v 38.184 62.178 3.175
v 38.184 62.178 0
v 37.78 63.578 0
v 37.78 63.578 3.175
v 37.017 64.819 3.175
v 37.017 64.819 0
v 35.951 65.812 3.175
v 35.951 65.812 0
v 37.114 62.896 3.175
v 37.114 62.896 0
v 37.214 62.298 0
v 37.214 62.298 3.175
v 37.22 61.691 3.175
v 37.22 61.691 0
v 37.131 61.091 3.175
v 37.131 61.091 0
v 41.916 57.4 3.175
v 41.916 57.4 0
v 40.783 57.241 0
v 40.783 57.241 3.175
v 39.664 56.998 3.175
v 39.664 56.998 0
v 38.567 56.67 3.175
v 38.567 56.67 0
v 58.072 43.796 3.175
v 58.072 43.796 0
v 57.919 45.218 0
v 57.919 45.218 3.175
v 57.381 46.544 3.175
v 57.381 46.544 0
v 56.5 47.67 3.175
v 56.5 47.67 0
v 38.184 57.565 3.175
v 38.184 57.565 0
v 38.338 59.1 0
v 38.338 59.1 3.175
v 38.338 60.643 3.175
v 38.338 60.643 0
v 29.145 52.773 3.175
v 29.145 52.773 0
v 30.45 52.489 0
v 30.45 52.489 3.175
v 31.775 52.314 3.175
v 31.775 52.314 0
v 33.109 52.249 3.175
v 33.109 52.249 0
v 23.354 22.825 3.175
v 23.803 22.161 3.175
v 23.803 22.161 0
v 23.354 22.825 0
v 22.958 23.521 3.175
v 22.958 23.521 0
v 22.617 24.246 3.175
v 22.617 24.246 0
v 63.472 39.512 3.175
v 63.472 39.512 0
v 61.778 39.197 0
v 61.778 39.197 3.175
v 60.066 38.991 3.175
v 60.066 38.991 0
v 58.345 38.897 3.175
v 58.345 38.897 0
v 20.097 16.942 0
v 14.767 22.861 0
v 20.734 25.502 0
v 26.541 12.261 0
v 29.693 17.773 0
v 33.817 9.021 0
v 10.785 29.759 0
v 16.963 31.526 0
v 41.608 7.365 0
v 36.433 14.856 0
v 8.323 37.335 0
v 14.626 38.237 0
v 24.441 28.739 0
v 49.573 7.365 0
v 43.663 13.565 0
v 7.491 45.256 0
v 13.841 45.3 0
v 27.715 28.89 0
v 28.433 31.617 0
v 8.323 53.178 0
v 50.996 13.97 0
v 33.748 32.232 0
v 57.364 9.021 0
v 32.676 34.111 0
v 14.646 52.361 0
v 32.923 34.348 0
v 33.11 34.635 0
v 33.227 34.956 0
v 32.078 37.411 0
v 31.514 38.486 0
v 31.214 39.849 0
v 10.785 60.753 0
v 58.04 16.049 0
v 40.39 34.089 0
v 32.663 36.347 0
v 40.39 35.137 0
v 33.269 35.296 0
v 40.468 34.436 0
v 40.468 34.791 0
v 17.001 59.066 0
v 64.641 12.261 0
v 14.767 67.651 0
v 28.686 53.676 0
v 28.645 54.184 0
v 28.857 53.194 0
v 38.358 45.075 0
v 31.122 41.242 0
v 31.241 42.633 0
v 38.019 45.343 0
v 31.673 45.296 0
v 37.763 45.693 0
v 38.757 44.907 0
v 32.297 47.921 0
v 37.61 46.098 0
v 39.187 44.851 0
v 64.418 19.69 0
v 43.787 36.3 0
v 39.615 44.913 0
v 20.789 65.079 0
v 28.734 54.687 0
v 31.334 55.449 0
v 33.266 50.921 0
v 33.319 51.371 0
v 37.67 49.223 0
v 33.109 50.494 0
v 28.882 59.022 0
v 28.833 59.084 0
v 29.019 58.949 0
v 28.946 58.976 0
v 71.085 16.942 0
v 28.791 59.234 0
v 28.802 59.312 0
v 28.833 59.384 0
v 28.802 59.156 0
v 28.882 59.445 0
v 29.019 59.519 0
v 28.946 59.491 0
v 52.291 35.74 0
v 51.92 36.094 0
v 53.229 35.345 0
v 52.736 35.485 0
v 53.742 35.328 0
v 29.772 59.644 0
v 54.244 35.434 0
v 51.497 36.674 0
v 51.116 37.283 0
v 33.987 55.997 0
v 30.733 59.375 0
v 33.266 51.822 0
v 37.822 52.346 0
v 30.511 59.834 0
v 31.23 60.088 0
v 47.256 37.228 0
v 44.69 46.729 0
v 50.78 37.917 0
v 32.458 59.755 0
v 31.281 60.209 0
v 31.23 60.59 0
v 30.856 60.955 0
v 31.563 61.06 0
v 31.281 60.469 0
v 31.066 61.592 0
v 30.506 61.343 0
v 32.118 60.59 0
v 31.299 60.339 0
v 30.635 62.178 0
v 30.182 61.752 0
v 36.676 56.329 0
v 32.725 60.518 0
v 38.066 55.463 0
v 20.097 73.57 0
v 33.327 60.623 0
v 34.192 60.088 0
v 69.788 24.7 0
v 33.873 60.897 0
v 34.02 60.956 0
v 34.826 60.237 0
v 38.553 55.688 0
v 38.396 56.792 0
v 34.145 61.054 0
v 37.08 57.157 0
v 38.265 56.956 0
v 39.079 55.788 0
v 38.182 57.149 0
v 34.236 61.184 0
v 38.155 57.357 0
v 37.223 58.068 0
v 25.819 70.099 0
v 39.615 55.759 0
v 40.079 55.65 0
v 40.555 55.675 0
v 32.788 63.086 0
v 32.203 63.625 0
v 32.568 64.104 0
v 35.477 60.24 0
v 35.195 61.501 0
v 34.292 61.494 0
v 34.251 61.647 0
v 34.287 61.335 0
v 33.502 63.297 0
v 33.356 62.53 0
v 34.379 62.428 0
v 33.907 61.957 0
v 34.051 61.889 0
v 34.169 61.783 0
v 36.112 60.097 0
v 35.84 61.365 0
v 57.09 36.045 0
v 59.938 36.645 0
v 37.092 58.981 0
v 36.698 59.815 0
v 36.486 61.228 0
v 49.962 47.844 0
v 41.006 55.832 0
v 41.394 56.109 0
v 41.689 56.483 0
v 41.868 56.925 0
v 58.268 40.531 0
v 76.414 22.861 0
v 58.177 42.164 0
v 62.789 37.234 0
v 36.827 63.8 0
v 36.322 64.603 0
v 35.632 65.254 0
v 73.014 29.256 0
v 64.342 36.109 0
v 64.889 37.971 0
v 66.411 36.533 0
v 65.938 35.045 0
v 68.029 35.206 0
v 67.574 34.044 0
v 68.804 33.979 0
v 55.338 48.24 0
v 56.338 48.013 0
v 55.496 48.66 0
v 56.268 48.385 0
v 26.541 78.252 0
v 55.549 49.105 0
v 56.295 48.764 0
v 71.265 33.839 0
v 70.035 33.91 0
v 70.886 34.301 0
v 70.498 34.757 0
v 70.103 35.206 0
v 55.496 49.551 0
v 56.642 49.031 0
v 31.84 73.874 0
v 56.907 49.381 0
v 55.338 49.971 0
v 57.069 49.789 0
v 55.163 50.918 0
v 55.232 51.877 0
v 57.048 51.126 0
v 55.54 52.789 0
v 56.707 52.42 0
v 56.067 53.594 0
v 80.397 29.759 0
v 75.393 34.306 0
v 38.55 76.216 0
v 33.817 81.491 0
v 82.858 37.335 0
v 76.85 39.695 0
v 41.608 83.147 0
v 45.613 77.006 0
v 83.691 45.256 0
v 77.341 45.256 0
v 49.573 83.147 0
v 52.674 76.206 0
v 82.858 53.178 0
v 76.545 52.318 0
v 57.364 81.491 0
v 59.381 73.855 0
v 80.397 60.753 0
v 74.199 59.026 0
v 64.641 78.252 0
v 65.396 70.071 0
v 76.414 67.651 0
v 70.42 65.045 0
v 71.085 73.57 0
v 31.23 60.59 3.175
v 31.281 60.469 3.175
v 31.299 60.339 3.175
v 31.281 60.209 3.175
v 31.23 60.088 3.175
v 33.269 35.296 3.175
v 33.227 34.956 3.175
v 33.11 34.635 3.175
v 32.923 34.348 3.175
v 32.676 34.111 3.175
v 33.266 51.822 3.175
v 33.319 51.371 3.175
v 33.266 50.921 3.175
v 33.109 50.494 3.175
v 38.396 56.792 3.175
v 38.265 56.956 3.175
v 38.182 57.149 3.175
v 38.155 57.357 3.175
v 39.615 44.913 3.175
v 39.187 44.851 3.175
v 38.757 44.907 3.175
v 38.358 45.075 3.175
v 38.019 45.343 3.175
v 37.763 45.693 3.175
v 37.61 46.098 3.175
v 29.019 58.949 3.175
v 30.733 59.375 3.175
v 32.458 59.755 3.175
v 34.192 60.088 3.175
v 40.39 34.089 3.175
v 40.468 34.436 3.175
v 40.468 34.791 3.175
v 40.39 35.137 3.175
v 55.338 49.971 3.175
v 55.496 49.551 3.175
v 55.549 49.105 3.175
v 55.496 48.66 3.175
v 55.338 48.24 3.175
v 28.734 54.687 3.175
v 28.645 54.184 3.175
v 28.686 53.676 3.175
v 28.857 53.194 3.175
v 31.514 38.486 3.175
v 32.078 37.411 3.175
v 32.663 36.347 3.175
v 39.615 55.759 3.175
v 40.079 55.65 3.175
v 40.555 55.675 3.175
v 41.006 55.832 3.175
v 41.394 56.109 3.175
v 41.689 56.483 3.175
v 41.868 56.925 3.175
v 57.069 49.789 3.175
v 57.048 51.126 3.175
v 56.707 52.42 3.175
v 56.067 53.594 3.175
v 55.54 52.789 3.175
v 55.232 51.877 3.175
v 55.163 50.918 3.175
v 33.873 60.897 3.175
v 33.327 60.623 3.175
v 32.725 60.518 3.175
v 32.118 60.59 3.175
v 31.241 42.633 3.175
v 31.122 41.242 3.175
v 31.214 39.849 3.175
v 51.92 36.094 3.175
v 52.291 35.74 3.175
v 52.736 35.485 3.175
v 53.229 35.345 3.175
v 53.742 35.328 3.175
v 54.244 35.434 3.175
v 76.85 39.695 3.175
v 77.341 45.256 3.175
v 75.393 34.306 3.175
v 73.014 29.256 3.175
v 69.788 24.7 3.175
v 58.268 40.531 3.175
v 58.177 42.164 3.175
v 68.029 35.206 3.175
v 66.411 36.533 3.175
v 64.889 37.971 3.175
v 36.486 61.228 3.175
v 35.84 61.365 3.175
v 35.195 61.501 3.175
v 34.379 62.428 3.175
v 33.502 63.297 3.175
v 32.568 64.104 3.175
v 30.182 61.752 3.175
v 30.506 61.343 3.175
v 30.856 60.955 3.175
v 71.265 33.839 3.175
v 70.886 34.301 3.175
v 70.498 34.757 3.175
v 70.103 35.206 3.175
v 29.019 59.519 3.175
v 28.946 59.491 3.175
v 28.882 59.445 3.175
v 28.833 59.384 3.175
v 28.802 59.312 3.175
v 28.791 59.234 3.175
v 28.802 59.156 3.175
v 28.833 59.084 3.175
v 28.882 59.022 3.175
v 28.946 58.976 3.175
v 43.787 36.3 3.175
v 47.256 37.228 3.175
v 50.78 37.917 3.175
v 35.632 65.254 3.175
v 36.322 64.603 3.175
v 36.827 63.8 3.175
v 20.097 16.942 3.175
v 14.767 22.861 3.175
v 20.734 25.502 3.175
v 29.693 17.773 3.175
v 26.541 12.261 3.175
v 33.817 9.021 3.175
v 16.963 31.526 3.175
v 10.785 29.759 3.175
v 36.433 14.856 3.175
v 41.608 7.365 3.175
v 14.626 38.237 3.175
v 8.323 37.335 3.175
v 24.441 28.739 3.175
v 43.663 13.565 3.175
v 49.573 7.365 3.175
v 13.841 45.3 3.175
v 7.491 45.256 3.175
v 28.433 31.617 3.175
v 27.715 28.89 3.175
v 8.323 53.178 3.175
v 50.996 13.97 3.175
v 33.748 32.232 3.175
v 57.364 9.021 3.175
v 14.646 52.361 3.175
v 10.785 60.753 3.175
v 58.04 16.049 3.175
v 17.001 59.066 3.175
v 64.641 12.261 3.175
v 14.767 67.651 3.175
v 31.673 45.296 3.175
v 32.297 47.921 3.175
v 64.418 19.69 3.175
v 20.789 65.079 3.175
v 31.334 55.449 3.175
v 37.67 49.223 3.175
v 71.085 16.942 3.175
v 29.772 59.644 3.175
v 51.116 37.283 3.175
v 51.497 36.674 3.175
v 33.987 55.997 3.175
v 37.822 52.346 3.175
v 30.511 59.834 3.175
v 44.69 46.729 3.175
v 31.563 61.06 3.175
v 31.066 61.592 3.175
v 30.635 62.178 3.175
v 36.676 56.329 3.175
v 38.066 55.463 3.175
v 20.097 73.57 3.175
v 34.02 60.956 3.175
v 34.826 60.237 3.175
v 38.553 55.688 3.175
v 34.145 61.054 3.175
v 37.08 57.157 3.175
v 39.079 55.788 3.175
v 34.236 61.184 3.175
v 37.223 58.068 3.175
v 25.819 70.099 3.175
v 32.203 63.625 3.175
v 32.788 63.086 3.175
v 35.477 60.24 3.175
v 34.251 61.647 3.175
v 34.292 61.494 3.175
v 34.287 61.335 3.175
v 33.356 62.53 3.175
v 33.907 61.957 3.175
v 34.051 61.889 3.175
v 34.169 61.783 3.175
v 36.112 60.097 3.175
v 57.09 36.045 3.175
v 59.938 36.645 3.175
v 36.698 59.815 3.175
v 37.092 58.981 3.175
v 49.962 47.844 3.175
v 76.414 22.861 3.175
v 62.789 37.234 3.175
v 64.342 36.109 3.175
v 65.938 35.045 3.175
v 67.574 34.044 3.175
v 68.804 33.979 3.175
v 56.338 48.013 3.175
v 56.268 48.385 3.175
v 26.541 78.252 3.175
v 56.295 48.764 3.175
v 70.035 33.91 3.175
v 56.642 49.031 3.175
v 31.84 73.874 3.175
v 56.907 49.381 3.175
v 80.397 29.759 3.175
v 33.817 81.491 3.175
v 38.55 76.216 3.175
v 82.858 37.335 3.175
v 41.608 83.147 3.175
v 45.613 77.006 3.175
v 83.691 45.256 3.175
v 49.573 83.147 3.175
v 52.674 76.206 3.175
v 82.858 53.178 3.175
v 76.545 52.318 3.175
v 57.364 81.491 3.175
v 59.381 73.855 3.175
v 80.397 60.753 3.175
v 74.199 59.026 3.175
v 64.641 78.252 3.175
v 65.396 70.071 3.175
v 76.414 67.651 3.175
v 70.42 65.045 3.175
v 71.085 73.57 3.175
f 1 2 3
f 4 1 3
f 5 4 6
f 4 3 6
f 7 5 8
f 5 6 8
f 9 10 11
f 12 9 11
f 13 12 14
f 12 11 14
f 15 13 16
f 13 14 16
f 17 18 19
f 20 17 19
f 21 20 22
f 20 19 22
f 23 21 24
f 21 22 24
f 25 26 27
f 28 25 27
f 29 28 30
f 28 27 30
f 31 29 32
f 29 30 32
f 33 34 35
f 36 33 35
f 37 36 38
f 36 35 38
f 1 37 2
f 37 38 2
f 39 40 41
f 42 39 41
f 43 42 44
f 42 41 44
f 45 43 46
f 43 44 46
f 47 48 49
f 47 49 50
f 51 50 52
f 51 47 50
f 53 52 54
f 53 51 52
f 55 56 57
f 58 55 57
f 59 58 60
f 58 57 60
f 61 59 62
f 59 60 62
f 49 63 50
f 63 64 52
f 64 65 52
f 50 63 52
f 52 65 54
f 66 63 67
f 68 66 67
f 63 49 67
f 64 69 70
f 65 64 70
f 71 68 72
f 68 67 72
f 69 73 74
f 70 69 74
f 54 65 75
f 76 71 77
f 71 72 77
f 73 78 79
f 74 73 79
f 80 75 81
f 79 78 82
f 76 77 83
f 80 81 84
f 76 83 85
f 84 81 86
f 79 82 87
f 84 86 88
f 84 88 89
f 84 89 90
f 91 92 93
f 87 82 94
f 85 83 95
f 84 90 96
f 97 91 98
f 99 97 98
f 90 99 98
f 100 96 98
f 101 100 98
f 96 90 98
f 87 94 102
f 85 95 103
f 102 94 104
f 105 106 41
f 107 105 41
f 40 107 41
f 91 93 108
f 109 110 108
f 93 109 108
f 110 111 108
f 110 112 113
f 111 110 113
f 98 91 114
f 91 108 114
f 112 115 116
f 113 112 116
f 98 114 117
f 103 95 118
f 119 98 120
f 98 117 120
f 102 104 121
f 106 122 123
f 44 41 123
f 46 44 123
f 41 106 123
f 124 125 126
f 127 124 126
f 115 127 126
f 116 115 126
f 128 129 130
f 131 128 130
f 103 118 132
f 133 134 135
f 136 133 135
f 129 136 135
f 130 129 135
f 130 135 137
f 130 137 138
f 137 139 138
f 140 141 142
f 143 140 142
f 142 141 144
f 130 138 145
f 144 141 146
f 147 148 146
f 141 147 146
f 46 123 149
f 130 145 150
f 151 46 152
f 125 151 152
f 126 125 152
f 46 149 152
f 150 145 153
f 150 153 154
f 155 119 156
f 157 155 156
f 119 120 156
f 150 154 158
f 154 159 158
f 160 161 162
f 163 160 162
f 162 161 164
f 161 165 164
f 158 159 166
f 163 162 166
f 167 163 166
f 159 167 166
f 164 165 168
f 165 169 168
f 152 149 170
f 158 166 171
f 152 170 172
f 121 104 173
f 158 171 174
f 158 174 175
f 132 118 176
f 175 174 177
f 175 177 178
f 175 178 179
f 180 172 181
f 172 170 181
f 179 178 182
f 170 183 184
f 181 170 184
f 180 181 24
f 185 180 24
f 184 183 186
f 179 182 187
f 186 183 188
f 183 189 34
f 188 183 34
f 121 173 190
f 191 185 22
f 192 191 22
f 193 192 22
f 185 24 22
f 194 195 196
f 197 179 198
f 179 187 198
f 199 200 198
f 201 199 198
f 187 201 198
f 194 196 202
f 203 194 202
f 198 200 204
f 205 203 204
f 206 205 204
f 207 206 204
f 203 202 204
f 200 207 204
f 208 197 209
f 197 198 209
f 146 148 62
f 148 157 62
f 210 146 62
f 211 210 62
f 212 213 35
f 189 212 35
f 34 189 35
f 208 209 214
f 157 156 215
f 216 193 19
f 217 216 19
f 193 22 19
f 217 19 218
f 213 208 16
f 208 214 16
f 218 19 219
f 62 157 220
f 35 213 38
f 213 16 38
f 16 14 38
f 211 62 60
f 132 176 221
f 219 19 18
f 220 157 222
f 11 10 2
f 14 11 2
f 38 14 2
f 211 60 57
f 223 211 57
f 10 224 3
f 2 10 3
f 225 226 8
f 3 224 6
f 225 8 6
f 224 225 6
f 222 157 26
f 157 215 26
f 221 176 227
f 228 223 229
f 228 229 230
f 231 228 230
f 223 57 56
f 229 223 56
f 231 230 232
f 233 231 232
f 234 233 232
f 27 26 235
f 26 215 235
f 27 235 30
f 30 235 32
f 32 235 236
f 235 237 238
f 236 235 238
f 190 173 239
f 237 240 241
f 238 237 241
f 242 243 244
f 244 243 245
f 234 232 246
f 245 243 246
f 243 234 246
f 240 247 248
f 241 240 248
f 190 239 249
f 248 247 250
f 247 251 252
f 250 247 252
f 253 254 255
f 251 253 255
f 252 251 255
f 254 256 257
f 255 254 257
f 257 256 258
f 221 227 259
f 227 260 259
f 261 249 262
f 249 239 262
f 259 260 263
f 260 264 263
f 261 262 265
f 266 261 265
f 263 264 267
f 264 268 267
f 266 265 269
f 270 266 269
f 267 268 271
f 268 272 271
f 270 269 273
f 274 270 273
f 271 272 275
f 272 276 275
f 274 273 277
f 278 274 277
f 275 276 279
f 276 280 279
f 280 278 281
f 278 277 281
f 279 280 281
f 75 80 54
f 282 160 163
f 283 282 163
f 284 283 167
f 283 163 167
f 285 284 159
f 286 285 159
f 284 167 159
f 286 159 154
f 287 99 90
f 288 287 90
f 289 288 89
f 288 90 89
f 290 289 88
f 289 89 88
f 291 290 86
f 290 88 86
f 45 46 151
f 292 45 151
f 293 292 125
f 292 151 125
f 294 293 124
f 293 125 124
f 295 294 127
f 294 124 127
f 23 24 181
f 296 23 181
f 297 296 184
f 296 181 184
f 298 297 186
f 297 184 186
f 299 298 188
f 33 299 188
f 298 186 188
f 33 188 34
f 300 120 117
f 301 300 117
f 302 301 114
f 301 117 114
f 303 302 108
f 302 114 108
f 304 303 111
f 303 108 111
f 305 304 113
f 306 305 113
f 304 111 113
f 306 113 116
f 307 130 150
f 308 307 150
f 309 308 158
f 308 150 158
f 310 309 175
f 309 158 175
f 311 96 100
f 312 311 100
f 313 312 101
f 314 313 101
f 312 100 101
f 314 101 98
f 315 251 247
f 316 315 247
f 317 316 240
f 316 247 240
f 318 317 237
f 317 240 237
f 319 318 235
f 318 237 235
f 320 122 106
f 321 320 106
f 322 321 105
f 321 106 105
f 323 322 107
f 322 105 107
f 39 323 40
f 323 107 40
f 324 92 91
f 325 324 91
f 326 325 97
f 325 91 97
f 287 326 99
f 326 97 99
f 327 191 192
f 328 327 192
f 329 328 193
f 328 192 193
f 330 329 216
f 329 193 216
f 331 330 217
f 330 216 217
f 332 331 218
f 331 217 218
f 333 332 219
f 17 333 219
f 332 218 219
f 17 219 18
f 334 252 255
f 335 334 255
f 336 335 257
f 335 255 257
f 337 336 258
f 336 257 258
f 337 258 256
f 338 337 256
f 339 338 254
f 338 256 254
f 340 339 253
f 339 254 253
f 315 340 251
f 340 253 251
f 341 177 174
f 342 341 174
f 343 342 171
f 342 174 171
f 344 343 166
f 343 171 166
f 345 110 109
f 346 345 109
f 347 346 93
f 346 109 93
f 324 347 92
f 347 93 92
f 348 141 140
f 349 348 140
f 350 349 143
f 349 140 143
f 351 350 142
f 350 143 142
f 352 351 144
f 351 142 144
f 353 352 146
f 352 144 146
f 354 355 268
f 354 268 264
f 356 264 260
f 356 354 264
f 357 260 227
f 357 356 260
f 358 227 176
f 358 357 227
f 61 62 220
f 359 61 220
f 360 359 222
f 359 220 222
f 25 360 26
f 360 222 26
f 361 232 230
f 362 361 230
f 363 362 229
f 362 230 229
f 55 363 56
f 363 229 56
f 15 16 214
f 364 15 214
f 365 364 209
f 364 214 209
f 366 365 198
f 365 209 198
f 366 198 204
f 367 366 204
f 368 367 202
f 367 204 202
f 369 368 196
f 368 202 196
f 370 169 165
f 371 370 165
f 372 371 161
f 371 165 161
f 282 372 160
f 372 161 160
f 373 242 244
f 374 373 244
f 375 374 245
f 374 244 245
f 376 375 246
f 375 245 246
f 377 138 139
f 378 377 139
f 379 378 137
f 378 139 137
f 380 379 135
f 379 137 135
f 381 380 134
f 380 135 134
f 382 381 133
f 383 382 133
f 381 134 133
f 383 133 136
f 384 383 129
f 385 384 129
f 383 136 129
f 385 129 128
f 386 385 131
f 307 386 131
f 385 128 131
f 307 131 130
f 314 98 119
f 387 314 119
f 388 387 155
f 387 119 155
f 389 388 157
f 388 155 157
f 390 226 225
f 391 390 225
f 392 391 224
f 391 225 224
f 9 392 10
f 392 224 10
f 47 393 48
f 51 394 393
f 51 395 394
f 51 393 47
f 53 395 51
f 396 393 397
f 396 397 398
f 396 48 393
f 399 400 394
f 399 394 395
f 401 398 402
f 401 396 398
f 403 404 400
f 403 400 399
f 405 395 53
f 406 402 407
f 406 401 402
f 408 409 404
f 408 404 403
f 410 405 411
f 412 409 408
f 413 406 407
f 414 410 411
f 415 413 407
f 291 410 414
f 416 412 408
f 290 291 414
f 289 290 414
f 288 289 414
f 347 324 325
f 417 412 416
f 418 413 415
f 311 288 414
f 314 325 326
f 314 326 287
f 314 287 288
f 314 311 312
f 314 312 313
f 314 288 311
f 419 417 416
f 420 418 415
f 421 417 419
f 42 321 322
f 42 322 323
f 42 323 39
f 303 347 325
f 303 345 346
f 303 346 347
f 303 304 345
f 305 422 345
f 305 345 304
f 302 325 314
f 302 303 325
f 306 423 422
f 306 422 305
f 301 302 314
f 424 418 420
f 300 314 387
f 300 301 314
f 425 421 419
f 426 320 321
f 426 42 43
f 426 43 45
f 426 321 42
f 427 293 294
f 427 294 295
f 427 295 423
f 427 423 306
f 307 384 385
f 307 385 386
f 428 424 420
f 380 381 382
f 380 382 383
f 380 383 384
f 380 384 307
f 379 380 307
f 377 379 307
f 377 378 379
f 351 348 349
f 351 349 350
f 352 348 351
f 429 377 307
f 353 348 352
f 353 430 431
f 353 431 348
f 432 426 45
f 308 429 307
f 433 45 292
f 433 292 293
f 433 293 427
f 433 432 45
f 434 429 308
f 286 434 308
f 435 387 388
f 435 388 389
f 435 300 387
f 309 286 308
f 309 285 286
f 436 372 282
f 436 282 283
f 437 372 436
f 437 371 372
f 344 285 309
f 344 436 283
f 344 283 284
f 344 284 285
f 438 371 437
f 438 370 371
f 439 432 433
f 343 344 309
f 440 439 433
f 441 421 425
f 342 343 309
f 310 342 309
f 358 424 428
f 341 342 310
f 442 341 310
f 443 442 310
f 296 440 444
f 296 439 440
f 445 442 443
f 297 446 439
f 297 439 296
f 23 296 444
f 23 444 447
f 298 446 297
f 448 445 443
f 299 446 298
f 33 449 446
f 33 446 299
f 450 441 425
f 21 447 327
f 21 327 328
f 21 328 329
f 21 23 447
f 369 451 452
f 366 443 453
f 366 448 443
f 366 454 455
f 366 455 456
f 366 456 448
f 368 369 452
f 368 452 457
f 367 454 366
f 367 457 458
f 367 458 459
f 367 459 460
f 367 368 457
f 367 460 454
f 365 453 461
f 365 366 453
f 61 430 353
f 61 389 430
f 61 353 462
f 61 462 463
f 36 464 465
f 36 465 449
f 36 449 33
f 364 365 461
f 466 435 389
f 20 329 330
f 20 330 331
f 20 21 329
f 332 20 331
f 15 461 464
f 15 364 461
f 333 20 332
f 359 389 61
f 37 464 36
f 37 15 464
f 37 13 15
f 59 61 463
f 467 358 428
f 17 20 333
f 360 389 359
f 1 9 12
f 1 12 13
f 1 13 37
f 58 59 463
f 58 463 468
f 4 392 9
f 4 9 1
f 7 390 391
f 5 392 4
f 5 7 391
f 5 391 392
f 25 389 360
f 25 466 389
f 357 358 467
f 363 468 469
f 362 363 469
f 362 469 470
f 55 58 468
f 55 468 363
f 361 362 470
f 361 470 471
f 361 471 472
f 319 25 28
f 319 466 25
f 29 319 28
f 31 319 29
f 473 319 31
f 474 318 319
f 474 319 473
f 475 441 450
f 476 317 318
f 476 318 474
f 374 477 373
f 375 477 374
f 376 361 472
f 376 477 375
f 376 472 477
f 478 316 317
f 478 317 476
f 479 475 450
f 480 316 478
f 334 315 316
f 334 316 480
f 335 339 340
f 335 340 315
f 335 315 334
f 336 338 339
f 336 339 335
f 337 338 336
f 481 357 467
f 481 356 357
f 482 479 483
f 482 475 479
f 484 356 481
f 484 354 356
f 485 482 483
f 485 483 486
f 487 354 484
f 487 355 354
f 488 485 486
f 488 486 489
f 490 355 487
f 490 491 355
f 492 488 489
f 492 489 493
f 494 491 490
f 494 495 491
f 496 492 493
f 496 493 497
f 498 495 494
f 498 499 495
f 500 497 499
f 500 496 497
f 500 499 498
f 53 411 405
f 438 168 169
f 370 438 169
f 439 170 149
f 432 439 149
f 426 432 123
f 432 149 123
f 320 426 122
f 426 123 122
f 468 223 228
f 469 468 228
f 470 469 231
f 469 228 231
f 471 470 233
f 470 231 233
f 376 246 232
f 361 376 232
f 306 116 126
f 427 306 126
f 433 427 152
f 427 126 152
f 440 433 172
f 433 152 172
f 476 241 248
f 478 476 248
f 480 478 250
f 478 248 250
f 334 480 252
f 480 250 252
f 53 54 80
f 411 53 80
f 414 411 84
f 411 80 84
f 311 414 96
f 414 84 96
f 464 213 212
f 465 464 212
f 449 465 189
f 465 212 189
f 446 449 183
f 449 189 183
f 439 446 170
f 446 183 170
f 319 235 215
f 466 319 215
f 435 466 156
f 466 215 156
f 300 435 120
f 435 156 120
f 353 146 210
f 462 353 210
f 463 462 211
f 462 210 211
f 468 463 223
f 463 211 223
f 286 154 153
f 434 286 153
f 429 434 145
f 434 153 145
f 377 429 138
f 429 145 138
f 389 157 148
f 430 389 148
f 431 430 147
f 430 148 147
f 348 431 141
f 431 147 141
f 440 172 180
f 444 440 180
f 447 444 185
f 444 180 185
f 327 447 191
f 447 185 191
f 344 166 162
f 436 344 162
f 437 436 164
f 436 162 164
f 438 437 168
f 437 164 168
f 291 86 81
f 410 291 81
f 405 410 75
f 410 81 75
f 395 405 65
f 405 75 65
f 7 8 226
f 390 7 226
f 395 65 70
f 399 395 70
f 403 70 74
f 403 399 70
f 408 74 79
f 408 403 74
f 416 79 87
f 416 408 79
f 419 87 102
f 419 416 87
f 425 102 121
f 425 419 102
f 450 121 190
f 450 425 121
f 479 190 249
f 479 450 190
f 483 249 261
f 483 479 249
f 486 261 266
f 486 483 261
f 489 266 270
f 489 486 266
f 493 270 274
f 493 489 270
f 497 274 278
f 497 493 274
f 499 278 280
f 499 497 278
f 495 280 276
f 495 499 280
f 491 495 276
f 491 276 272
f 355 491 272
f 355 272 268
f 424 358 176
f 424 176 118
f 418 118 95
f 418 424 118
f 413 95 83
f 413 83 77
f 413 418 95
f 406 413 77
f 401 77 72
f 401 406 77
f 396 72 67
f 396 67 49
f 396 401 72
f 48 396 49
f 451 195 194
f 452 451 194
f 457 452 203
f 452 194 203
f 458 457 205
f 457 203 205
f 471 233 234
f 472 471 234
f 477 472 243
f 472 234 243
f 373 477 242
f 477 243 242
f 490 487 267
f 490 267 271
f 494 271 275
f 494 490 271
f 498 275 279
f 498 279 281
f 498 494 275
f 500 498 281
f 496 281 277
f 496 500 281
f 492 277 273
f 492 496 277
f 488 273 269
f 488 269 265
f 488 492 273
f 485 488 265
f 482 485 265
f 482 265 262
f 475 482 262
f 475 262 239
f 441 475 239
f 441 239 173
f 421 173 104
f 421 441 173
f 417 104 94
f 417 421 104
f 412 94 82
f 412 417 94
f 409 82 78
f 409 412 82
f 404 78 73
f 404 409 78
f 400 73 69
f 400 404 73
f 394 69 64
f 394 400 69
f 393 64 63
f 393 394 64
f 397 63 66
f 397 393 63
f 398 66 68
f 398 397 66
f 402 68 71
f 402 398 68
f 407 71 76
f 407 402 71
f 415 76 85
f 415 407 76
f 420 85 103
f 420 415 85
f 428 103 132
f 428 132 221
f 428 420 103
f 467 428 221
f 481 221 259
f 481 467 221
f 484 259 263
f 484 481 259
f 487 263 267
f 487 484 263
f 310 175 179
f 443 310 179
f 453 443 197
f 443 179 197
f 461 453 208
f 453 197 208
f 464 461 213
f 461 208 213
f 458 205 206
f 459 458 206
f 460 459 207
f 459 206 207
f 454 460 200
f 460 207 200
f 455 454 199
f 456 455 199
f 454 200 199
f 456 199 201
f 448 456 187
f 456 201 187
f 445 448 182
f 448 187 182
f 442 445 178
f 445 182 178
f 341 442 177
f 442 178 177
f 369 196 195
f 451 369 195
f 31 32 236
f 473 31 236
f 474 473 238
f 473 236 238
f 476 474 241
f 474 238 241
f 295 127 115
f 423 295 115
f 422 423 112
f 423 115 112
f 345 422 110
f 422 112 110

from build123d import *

# Parameters (mm, degrees)
F1_DEPTH = 3.175
F2_R     = 38.1
F3_DEPTH = 3.175


with BuildPart() as f1:
    # F0 (on Top) → F1 (new body)
    with BuildSketch(Plane.XY):
        with BuildLine():
            ThreePointArc((22.616535, 24.245614), (30.63387, 30.737001), (40.389795, 34.089267))
            ThreePointArc((40.389795, 34.089267), (40.477862, 34.61335), (40.389795, 35.137434))
            ThreePointArc((40.389795, 35.137434), (45.513697, 36.794109), (50.780315, 37.917353))
            ThreePointArc((50.780315, 37.917353), (51.300846, 36.975201), (51.919628, 36.094457))
            ThreePointArc((51.919628, 36.094457), (52.978288, 35.400243), (54.243822, 35.433657))
            ThreePointArc((54.243822, 35.433657), (58.513462, 36.346899), (62.788658, 37.233766))
            ThreePointArc((62.788658, 37.233766), (65.134653, 35.56889), (67.573771, 34.043696))
            ThreePointArc((67.573771, 34.043696), (69.419666, 33.94496), (71.265139, 33.838619))
            ThreePointArc((71.265139, 33.838619), (70.692959, 34.529744), (70.103042, 35.205793))
            Line((70.103042, 35.205793), (68.029493, 35.205793))
            ThreePointArc((68.029493, 35.205793), (65.637095, 37.238695), (63.472249, 39.512392))
            ThreePointArc((63.472249, 39.512392), (60.923729, 39.08034), (58.345344, 38.897164))
            ThreePointArc((58.345344, 38.897164), (58.224015, 41.347541), (58.071908, 43.7962))
            ThreePointArc((58.071908, 43.7962), (57.696674, 45.899805), (56.499656, 47.669861))
            ThreePointArc((56.499656, 47.669861), (56.290628, 48.196762), (56.294583, 48.763596))
            ThreePointArc((56.294583, 48.763596), (56.786119, 49.19758), (57.069313, 49.788978))
            ThreePointArc((57.069313, 49.788978), (56.916742, 51.783508), (56.066722, 53.59428))
            ThreePointArc((56.066722, 53.59428), (55.232372, 51.877319), (55.337559, 49.971268))
            ThreePointArc((55.337559, 49.971268), (55.549432, 49.105391), (55.337559, 48.239514))
            ThreePointArc((55.337559, 48.239514), (47.307111, 47.375759), (39.615061, 44.912722))
            ThreePointArc((39.615061, 44.912722), (38.358176, 45.074826), (37.609871, 46.097606))
            ThreePointArc((37.609871, 46.097606), (37.734106, 50.78522), (38.065597, 55.462748))
            ThreePointArc((38.065597, 55.462748), (38.812979, 55.753921), (39.615061, 55.758972))
            ThreePointArc((39.615061, 55.758972), (41.209501, 55.956812), (41.916471, 57.399578))
            ThreePointArc((41.916471, 57.399578), (40.221037, 57.129852), (38.566899, 56.67042))
            ThreePointArc((38.566899, 56.67042), (38.216858, 57.049557), (38.18446, 57.564557))
            ThreePointArc((38.18446, 57.564557), (38.357401, 59.871413), (38.18446, 62.178269))
            ThreePointArc((38.18446, 62.178269), (37.440835, 64.224424), (35.951093, 65.811999))
            Line((35.951093, 65.811999), (35.632402, 65.254405))
            ThreePointArc((35.632402, 65.254405), (36.600109, 64.217879), (37.113506, 62.896036))
            ThreePointArc((37.113506, 62.896036), (37.228471, 61.99454), (37.131365, 61.090946))
            ThreePointArc((37.131365, 61.090946), (36.163108, 61.296761), (35.194539, 61.501101))
            ThreePointArc((35.194539, 61.501101), (33.947714, 62.86964), (32.567654, 64.1037))
            Line((32.567654, 64.1037), (32.203075, 63.625194))
            ThreePointArc((32.203075, 63.625194), (33.07375, 62.810062), (33.907115, 61.956823))
            ThreePointArc((33.907115, 61.956823), (34.294902, 61.413983), (33.872936, 60.897265))
            ThreePointArc((33.872936, 60.897265), (33.029886, 60.548272), (32.118395, 60.589653))
            ThreePointArc((32.118395, 60.589653), (31.306391, 61.318256), (30.63513, 62.178269))
            Line((30.63513, 62.178269), (30.181566, 61.751749))
            ThreePointArc((30.181566, 61.751749), (30.678242, 61.14598), (31.229733, 60.589653))
            ThreePointArc((31.229733, 60.589653), (31.298619, 60.339004), (31.229733, 60.088355))
            ThreePointArc((31.229733, 60.088355), (30.143393, 59.730613), (29.019469, 59.518699))
            ThreePointArc((29.019469, 59.518699), (28.791384, 59.23387), (29.019469, 58.949042))
            ThreePointArc((29.019469, 58.949042), (31.594216, 59.570867), (34.191944, 60.088355))
            ThreePointArc((34.191944, 60.088355), (35.476697, 60.240495), (36.698427, 59.814919))
            ThreePointArc((36.698427, 59.814919), (37.22257, 58.068271), (36.675639, 56.328624))
            ThreePointArc((36.675639, 56.328624), (32.654946, 55.750122), (28.734472, 54.686859))
            ThreePointArc((28.734472, 54.686859), (28.6864, 53.675594), (29.144622, 52.77282))
            ThreePointArc((29.144622, 52.77282), (31.110795, 52.387996), (33.109426, 52.248735))
            ThreePointArc((33.109426, 52.248735), (33.318546, 51.371466), (33.109426, 50.494198))
            ThreePointArc((33.109426, 50.494198), (31.960889, 46.614509), (31.240953, 42.632949))
            ThreePointArc((31.240953, 42.632949), (31.141519, 40.543829), (31.514391, 38.485851))
            ThreePointArc((31.514391, 38.485851), (32.367516, 36.877537), (33.268929, 35.295781))
            ThreePointArc((33.268929, 35.295781), (33.110196, 34.634594), (32.676484, 34.110896))
            ThreePointArc((32.676484, 34.110896), (25.940865, 29.887543), (19.916199, 24.700185))
            Line((19.916199, 24.700185), (22.616535, 24.245614))
        make_face()
    extrude(amount=F1_DEPTH)

    # F2 (on face) → F3 (join)
    with BuildSketch(Plane.XY.offset(3.175)):
        with Locations((45.590669, 45.256092)):
            Circle(F2_R)
        with BuildLine():
            ThreePointArc((69.788132, 24.700185), (47.34104, 13.554378), (23.803331, 22.161192))
            ThreePointArc((23.803331, 22.161192), (22.563249, 23.397446), (21.393206, 24.700185))
            ThreePointArc((21.393206, 24.700185), (34.640941, 75.058206), (77.340669, 45.256092))
            ThreePointArc((77.340669, 45.256092), (75.392782, 34.306365), (69.788132, 24.700185))
        make_face(mode=Mode.SUBTRACT)
        with BuildLine():
            ThreePointArc((23.803331, 22.161192), (23.149346, 23.168907), (22.616535, 24.245614))
            Line((22.616535, 24.245614), (22.616535, 24.700185))
            Line((22.616535, 24.700185), (21.393206, 24.700185))
            ThreePointArc((21.393206, 24.700185), (22.563249, 23.397446), (23.803331, 22.161192))
        make_face()
    extrude(amount=-F3_DEPTH)


solid = f1.part
